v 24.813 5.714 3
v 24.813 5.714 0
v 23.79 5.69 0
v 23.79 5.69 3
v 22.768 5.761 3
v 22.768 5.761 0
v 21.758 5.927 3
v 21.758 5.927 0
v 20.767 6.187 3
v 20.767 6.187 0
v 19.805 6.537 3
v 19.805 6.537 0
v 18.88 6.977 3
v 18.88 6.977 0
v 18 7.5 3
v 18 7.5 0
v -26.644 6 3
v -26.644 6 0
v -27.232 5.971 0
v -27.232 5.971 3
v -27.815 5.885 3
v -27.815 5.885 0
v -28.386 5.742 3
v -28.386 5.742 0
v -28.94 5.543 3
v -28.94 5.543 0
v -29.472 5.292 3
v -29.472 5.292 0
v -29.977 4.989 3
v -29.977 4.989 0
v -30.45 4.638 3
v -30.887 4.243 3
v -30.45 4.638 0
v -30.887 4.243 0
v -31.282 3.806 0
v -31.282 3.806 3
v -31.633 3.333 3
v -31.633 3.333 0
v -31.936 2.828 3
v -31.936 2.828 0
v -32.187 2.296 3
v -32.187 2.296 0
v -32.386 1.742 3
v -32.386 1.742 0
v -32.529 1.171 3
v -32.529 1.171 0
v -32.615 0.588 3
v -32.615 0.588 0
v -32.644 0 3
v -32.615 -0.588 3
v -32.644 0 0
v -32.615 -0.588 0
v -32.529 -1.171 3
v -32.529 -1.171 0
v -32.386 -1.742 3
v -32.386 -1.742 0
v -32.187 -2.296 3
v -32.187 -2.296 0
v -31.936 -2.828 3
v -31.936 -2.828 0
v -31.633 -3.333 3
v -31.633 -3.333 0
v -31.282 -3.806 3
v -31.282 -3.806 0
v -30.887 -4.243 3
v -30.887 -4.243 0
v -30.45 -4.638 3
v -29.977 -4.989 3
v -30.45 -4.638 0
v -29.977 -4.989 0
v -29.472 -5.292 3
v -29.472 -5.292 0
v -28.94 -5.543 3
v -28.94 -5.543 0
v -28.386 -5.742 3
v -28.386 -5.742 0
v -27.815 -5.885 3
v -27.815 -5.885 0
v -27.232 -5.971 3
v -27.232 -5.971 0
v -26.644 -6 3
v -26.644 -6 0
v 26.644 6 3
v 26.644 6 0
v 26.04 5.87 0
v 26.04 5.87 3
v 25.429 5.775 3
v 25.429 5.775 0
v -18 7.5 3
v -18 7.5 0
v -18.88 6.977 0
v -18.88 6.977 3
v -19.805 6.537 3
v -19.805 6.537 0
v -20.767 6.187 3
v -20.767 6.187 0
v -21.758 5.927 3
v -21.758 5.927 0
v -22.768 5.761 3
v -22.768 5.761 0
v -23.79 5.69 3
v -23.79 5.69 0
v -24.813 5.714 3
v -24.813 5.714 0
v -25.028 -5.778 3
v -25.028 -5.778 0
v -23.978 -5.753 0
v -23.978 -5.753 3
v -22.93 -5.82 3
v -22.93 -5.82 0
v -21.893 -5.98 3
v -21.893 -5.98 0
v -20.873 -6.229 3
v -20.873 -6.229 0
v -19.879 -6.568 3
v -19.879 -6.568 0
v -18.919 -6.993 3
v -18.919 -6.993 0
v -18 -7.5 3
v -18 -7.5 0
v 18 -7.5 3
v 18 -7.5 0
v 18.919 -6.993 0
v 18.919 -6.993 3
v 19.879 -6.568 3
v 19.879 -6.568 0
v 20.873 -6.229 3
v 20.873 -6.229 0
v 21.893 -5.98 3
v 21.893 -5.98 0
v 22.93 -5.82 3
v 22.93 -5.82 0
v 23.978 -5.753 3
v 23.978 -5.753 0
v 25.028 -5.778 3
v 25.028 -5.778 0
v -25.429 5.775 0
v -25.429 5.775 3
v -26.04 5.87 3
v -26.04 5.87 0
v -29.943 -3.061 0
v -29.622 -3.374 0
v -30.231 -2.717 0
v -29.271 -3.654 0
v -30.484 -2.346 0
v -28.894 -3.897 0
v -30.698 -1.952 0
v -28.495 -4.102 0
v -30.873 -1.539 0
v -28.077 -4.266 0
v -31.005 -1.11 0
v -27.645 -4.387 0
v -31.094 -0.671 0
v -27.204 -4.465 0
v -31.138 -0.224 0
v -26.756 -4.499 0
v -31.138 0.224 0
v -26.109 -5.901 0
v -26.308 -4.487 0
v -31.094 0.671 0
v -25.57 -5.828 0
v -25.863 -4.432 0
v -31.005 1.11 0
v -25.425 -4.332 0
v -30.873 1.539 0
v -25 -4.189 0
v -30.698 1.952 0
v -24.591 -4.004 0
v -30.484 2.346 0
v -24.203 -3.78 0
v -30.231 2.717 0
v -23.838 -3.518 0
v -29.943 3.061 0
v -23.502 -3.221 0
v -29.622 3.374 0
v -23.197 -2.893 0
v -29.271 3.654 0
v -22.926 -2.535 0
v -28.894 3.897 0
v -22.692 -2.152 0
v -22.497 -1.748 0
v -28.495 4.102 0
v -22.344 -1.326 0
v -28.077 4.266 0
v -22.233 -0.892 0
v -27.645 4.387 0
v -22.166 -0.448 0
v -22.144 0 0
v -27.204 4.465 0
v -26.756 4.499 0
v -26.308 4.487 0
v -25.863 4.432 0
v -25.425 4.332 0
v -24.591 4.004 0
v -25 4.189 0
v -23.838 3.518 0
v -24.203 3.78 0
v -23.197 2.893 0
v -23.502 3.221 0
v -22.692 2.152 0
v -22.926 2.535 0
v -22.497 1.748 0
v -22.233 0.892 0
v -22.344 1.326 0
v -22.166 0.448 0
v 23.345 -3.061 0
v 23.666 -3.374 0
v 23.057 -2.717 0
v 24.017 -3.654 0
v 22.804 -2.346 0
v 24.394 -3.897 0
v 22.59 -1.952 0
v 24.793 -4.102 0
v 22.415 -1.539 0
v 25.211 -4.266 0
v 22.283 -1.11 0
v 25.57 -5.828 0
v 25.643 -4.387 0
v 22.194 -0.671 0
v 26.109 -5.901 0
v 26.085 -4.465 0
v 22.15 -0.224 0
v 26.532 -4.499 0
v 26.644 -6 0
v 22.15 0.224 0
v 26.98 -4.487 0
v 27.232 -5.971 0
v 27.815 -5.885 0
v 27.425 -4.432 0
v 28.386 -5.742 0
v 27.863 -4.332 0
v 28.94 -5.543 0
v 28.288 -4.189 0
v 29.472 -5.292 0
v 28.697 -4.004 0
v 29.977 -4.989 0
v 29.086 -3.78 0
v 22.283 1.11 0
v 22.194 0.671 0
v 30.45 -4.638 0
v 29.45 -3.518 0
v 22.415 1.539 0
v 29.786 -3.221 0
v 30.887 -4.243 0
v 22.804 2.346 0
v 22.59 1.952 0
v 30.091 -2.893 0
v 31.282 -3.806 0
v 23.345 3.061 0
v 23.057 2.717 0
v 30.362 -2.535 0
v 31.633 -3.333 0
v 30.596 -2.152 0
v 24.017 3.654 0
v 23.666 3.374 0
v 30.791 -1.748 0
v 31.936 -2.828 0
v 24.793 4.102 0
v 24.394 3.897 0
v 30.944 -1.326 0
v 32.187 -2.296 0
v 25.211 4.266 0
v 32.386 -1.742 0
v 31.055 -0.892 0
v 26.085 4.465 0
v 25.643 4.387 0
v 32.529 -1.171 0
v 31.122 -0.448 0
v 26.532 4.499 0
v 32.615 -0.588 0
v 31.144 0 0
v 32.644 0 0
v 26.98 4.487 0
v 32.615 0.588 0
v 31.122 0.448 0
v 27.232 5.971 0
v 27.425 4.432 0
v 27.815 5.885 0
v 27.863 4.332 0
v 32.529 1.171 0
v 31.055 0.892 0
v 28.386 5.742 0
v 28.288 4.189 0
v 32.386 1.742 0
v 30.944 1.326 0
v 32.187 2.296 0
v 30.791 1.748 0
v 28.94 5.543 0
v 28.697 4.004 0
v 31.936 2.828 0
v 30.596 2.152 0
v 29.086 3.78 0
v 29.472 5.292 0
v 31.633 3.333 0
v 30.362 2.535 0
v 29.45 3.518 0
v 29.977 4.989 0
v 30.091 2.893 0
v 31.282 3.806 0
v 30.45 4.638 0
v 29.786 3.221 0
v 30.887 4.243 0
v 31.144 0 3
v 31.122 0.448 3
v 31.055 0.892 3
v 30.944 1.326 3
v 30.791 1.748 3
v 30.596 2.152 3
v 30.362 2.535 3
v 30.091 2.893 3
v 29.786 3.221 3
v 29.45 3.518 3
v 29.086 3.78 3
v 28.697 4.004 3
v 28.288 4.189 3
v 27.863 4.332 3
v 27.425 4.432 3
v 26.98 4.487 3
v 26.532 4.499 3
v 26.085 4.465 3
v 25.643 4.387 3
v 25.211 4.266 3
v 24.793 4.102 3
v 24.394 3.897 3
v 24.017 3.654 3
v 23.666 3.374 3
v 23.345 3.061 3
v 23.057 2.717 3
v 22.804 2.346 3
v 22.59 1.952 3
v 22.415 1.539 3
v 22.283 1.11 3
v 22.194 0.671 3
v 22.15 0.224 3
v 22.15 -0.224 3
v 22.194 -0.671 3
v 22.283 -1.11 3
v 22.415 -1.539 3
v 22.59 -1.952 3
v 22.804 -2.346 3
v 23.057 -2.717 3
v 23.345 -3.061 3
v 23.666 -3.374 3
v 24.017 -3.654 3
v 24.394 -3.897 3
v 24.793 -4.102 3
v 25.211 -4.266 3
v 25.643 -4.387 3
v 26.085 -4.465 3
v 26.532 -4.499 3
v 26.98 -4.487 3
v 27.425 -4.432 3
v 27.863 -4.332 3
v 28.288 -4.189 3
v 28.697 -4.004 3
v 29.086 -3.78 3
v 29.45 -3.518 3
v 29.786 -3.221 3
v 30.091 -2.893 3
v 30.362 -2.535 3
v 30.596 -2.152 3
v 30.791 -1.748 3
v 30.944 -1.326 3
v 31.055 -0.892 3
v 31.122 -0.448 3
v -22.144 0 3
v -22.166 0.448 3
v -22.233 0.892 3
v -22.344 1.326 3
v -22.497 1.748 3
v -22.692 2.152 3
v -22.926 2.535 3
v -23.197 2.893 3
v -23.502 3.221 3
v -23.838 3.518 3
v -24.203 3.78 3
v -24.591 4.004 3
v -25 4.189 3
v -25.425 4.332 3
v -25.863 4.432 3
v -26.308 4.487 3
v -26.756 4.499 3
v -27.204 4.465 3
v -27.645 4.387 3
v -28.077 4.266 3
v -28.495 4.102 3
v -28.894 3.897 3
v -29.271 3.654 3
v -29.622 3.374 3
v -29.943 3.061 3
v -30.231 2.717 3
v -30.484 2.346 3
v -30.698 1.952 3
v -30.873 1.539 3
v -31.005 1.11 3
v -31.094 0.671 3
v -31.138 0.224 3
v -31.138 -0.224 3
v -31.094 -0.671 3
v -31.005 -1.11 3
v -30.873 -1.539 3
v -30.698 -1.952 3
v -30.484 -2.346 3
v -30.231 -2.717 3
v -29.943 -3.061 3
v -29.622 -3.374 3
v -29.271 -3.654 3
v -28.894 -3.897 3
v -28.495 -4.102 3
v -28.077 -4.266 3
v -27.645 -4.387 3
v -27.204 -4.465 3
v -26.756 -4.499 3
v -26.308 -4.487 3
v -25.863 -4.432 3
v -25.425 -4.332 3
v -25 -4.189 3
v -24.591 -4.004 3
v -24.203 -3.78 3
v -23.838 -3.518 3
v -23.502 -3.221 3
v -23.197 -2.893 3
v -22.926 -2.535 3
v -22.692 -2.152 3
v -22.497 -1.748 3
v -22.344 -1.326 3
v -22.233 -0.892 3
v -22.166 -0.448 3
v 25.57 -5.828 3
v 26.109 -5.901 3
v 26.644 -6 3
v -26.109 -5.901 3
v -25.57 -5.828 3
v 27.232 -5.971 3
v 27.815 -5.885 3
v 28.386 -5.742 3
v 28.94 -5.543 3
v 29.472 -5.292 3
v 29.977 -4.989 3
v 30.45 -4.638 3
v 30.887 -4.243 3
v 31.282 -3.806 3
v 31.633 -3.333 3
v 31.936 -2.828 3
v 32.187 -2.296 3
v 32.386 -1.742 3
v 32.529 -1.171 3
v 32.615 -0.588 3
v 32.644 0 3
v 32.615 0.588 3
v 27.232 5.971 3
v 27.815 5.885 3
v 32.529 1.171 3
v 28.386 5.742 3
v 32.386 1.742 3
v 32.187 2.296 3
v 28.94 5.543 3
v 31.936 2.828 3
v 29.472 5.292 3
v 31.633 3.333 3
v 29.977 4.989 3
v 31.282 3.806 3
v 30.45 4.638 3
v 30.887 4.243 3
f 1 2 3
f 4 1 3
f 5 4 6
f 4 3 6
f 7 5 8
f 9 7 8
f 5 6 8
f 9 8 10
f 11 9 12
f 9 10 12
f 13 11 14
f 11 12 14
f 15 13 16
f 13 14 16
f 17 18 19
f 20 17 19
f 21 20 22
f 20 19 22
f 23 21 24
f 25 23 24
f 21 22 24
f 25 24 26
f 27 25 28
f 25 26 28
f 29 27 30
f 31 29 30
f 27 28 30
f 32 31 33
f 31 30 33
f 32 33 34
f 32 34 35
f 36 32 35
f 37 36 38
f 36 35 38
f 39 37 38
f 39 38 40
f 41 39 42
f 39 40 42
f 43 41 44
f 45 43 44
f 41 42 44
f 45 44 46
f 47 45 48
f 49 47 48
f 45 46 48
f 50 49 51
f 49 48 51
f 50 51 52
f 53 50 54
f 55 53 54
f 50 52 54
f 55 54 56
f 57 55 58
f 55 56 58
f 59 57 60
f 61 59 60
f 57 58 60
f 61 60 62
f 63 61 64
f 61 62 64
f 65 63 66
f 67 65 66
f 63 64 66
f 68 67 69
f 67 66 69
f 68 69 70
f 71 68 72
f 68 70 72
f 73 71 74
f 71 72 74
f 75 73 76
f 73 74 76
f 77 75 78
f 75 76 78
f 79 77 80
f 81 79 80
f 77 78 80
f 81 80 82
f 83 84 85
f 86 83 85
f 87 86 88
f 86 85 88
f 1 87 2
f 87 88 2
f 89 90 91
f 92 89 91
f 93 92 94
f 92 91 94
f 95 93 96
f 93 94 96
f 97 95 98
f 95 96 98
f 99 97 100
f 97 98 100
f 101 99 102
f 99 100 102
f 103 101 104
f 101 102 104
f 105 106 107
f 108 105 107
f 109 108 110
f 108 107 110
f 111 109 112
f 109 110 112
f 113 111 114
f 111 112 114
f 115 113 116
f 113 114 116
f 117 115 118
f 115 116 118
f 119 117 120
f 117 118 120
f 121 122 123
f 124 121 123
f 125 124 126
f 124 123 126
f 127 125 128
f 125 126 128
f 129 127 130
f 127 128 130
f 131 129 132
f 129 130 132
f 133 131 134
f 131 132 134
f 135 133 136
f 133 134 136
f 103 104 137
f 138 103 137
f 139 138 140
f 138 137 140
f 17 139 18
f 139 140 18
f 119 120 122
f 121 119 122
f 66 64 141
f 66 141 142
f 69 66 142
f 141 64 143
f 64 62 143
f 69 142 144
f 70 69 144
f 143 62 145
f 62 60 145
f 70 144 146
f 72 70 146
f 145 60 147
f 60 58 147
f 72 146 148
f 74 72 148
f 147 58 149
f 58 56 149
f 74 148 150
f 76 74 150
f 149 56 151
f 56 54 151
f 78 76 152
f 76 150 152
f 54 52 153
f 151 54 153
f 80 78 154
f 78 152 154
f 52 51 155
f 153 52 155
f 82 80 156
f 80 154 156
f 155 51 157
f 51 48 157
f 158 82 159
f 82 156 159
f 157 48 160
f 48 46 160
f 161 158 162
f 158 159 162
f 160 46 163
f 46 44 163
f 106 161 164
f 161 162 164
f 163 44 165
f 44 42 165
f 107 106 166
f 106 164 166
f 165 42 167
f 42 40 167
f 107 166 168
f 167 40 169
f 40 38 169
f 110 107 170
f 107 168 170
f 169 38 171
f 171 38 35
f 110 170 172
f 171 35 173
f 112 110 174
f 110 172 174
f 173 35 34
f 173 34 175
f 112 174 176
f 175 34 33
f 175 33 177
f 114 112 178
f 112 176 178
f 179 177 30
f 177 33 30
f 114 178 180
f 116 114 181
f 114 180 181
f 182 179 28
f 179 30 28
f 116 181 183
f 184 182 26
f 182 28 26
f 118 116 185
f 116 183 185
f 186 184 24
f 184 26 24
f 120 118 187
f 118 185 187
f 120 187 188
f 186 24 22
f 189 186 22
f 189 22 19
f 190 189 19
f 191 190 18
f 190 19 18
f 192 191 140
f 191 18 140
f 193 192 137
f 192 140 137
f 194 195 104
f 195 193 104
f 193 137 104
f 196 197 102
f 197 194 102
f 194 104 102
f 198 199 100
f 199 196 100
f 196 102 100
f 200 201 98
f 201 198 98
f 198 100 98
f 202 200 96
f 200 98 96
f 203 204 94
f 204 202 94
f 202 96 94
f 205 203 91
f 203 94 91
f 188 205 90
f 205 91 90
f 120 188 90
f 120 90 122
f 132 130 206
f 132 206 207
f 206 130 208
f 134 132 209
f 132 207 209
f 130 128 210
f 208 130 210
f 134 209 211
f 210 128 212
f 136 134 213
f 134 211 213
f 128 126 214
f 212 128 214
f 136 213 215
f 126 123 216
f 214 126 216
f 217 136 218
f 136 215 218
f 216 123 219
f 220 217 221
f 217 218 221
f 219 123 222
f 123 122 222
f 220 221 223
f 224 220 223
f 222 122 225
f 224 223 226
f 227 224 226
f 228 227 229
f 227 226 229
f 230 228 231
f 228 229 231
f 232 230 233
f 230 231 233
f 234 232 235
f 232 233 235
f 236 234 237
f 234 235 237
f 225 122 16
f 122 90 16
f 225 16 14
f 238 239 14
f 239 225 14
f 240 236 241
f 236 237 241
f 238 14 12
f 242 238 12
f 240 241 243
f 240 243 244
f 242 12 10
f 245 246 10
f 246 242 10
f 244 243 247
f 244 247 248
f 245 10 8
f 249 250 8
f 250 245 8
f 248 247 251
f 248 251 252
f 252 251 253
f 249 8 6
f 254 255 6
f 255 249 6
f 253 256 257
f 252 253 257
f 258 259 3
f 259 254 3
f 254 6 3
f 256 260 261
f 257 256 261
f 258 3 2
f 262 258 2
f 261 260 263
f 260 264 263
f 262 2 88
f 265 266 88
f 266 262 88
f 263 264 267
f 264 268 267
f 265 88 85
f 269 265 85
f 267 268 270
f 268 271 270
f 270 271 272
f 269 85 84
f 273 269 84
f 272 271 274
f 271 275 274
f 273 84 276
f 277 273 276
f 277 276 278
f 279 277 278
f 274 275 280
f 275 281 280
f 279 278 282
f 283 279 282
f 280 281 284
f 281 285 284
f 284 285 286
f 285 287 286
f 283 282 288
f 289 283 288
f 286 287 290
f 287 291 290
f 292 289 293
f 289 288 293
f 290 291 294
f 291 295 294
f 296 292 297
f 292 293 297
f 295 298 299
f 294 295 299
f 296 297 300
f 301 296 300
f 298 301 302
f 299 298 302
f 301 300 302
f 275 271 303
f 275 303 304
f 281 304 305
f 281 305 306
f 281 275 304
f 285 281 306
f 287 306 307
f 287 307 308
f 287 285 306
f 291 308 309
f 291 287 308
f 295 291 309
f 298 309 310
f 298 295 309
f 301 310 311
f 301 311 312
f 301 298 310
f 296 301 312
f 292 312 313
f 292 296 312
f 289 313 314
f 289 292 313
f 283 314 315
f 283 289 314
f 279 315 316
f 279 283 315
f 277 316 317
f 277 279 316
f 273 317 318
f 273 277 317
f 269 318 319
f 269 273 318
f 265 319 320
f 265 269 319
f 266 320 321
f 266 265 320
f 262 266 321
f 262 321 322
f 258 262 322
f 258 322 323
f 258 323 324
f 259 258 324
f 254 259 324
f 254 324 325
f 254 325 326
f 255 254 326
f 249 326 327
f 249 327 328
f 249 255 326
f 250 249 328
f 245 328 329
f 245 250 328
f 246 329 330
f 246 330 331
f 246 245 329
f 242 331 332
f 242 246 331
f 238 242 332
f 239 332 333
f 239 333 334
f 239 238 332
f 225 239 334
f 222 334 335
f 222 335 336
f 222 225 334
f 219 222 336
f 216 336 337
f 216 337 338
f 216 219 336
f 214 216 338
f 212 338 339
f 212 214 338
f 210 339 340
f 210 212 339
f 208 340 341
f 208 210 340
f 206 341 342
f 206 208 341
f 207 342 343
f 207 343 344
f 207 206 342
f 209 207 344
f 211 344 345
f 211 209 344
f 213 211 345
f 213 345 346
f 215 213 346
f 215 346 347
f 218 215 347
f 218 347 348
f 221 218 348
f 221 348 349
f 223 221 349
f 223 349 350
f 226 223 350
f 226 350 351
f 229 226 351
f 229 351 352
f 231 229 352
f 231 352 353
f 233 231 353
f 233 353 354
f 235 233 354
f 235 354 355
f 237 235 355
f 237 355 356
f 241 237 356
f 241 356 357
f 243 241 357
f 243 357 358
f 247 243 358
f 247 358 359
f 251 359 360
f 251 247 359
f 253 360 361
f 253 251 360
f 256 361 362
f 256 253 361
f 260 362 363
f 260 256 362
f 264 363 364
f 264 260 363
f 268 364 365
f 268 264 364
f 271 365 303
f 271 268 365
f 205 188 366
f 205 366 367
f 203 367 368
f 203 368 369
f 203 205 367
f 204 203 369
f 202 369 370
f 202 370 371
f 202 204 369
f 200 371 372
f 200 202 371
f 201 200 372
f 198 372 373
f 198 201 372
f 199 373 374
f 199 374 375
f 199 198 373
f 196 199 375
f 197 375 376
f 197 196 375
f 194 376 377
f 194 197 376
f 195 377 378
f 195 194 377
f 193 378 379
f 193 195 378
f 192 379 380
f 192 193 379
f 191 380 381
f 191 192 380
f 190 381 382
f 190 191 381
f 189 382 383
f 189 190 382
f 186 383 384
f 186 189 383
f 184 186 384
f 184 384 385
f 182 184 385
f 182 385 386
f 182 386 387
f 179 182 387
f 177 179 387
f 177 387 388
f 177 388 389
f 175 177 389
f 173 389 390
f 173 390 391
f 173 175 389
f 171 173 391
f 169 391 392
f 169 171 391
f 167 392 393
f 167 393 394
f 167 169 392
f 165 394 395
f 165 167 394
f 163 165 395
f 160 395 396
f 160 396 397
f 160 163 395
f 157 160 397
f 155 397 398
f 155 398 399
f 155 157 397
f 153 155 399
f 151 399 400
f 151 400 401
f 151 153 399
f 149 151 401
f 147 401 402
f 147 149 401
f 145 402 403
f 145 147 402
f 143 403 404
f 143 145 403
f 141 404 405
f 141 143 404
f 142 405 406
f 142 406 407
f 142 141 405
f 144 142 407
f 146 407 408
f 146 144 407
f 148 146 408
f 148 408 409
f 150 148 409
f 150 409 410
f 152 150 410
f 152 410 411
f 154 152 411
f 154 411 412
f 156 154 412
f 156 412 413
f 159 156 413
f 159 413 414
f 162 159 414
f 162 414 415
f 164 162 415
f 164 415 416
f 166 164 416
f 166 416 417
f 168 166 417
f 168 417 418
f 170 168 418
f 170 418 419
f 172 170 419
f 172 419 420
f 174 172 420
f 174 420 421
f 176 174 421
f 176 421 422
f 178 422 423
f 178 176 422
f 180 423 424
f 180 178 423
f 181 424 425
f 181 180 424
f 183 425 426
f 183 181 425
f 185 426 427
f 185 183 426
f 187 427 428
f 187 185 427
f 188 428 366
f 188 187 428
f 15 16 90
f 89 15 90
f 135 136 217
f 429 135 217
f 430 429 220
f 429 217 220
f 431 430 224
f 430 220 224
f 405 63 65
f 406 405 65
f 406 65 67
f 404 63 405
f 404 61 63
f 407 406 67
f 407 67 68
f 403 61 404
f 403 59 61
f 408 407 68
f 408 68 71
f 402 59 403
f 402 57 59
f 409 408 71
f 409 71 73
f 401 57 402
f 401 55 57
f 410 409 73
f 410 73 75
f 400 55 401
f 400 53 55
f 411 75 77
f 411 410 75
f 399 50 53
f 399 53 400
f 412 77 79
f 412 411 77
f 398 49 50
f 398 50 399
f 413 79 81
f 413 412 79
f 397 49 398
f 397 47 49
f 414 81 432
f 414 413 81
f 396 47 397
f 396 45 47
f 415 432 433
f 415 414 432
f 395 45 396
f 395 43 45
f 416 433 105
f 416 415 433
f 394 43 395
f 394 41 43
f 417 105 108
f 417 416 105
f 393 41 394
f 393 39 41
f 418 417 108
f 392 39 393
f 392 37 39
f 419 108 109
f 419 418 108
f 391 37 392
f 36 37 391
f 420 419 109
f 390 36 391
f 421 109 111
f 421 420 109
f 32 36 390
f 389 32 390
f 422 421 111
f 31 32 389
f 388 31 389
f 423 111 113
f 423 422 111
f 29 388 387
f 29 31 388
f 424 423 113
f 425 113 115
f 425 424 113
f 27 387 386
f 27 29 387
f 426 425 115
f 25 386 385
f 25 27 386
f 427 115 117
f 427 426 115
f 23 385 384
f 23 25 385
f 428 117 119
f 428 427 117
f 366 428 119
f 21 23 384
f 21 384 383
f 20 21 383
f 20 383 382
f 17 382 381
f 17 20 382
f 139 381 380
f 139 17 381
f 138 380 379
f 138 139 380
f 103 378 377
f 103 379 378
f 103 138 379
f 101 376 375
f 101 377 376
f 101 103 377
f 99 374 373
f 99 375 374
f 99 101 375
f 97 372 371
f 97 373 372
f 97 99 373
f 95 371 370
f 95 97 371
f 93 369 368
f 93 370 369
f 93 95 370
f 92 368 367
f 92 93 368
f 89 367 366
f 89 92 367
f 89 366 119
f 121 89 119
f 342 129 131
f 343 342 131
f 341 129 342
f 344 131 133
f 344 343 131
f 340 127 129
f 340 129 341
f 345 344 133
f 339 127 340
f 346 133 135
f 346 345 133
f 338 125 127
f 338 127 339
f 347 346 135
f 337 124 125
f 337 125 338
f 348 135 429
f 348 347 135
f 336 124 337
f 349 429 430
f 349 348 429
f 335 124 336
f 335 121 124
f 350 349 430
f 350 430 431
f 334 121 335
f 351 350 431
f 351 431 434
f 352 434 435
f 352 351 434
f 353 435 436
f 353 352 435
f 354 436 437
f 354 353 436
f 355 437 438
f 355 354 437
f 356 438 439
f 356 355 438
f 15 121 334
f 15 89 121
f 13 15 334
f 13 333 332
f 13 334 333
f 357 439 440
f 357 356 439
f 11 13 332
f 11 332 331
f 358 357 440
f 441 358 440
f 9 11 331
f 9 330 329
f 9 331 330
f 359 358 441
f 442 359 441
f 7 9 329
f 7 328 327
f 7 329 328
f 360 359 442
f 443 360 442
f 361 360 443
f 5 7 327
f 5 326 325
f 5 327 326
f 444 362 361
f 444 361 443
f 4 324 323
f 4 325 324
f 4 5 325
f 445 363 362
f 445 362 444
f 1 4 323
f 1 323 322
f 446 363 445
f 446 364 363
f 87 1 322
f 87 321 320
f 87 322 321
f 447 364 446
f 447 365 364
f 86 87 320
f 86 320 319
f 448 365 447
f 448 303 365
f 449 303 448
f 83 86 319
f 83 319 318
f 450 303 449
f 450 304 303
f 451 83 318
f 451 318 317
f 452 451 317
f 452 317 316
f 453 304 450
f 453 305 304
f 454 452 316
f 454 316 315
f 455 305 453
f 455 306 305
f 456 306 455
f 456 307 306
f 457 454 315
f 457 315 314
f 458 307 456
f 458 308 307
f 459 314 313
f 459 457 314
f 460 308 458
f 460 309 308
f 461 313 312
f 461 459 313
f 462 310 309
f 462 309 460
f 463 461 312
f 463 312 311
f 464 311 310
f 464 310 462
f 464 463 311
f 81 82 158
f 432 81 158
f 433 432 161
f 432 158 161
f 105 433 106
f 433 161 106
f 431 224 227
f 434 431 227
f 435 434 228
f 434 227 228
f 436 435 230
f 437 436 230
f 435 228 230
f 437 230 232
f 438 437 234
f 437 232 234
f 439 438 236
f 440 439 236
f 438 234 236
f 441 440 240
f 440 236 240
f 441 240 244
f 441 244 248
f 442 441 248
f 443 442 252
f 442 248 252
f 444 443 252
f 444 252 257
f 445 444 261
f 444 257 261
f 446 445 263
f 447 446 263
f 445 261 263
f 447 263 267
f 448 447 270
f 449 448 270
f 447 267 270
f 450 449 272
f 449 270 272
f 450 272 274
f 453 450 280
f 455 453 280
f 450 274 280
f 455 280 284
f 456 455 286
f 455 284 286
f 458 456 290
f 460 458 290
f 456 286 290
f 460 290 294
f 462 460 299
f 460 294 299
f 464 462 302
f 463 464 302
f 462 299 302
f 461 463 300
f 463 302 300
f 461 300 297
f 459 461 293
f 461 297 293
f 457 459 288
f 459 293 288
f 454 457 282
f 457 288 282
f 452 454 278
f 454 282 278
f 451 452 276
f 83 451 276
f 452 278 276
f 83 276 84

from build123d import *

# Parameters (mm, degrees)
SKETCH1_R           = 4.5
BOSS_EXTRUDE1_DEPTH = 3


with BuildPart() as part:
    # Sketch1 → Boss-Extrude1 (new body)
    with BuildSketch(Plane.XY):
        with BuildLine():
            ThreePointArc((-25.027731338, -5.77818799), (-21.380140782, -6.093283782), (-18, -7.5))
            Line((-18, -7.5), (18, -7.5))
            ThreePointArc((18, -7.5), (21.380140782, -6.093283782), (25.027731338, -5.77818799))
            ThreePointArc((25.027731338, -5.77818799), (25.839696877, -5.861423129), (26.644067797, -6))
            ThreePointArc((26.644067797, -6), (32.644067797, 0), (26.644067797, 6))
            ThreePointArc((26.644067797, 6), (25.734720833, 5.818198735), (24.813267337, 5.713857688))
            ThreePointArc((24.813267337, 5.713857688), (21.259366627, 6.045176449), (18, 7.5))
            Line((18, 7.5), (-18, 7.5))
            ThreePointArc((-18, 7.5), (-21.259366627, 6.045176449), (-24.813267337, 5.713857688))
            ThreePointArc((-24.813267337, 5.713857688), (-25.734720833, 5.818198735), (-26.644067797, 6))
            ThreePointArc((-26.644067797, 6), (-32.644067797, 0), (-26.644067797, -6))
            ThreePointArc((-26.644067797, -6), (-25.839696877, -5.861423129), (-25.027731338, -5.77818799))
        make_face()
        with Locations((-26.644067797, 0)):
            Circle(SKETCH1_R, mode=Mode.SUBTRACT)
        with Locations((26.644067797, 0)):
            Circle(SKETCH1_R, mode=Mode.SUBTRACT)
    extrude(amount=BOSS_EXTRUDE1_DEPTH)


solid = part.part
